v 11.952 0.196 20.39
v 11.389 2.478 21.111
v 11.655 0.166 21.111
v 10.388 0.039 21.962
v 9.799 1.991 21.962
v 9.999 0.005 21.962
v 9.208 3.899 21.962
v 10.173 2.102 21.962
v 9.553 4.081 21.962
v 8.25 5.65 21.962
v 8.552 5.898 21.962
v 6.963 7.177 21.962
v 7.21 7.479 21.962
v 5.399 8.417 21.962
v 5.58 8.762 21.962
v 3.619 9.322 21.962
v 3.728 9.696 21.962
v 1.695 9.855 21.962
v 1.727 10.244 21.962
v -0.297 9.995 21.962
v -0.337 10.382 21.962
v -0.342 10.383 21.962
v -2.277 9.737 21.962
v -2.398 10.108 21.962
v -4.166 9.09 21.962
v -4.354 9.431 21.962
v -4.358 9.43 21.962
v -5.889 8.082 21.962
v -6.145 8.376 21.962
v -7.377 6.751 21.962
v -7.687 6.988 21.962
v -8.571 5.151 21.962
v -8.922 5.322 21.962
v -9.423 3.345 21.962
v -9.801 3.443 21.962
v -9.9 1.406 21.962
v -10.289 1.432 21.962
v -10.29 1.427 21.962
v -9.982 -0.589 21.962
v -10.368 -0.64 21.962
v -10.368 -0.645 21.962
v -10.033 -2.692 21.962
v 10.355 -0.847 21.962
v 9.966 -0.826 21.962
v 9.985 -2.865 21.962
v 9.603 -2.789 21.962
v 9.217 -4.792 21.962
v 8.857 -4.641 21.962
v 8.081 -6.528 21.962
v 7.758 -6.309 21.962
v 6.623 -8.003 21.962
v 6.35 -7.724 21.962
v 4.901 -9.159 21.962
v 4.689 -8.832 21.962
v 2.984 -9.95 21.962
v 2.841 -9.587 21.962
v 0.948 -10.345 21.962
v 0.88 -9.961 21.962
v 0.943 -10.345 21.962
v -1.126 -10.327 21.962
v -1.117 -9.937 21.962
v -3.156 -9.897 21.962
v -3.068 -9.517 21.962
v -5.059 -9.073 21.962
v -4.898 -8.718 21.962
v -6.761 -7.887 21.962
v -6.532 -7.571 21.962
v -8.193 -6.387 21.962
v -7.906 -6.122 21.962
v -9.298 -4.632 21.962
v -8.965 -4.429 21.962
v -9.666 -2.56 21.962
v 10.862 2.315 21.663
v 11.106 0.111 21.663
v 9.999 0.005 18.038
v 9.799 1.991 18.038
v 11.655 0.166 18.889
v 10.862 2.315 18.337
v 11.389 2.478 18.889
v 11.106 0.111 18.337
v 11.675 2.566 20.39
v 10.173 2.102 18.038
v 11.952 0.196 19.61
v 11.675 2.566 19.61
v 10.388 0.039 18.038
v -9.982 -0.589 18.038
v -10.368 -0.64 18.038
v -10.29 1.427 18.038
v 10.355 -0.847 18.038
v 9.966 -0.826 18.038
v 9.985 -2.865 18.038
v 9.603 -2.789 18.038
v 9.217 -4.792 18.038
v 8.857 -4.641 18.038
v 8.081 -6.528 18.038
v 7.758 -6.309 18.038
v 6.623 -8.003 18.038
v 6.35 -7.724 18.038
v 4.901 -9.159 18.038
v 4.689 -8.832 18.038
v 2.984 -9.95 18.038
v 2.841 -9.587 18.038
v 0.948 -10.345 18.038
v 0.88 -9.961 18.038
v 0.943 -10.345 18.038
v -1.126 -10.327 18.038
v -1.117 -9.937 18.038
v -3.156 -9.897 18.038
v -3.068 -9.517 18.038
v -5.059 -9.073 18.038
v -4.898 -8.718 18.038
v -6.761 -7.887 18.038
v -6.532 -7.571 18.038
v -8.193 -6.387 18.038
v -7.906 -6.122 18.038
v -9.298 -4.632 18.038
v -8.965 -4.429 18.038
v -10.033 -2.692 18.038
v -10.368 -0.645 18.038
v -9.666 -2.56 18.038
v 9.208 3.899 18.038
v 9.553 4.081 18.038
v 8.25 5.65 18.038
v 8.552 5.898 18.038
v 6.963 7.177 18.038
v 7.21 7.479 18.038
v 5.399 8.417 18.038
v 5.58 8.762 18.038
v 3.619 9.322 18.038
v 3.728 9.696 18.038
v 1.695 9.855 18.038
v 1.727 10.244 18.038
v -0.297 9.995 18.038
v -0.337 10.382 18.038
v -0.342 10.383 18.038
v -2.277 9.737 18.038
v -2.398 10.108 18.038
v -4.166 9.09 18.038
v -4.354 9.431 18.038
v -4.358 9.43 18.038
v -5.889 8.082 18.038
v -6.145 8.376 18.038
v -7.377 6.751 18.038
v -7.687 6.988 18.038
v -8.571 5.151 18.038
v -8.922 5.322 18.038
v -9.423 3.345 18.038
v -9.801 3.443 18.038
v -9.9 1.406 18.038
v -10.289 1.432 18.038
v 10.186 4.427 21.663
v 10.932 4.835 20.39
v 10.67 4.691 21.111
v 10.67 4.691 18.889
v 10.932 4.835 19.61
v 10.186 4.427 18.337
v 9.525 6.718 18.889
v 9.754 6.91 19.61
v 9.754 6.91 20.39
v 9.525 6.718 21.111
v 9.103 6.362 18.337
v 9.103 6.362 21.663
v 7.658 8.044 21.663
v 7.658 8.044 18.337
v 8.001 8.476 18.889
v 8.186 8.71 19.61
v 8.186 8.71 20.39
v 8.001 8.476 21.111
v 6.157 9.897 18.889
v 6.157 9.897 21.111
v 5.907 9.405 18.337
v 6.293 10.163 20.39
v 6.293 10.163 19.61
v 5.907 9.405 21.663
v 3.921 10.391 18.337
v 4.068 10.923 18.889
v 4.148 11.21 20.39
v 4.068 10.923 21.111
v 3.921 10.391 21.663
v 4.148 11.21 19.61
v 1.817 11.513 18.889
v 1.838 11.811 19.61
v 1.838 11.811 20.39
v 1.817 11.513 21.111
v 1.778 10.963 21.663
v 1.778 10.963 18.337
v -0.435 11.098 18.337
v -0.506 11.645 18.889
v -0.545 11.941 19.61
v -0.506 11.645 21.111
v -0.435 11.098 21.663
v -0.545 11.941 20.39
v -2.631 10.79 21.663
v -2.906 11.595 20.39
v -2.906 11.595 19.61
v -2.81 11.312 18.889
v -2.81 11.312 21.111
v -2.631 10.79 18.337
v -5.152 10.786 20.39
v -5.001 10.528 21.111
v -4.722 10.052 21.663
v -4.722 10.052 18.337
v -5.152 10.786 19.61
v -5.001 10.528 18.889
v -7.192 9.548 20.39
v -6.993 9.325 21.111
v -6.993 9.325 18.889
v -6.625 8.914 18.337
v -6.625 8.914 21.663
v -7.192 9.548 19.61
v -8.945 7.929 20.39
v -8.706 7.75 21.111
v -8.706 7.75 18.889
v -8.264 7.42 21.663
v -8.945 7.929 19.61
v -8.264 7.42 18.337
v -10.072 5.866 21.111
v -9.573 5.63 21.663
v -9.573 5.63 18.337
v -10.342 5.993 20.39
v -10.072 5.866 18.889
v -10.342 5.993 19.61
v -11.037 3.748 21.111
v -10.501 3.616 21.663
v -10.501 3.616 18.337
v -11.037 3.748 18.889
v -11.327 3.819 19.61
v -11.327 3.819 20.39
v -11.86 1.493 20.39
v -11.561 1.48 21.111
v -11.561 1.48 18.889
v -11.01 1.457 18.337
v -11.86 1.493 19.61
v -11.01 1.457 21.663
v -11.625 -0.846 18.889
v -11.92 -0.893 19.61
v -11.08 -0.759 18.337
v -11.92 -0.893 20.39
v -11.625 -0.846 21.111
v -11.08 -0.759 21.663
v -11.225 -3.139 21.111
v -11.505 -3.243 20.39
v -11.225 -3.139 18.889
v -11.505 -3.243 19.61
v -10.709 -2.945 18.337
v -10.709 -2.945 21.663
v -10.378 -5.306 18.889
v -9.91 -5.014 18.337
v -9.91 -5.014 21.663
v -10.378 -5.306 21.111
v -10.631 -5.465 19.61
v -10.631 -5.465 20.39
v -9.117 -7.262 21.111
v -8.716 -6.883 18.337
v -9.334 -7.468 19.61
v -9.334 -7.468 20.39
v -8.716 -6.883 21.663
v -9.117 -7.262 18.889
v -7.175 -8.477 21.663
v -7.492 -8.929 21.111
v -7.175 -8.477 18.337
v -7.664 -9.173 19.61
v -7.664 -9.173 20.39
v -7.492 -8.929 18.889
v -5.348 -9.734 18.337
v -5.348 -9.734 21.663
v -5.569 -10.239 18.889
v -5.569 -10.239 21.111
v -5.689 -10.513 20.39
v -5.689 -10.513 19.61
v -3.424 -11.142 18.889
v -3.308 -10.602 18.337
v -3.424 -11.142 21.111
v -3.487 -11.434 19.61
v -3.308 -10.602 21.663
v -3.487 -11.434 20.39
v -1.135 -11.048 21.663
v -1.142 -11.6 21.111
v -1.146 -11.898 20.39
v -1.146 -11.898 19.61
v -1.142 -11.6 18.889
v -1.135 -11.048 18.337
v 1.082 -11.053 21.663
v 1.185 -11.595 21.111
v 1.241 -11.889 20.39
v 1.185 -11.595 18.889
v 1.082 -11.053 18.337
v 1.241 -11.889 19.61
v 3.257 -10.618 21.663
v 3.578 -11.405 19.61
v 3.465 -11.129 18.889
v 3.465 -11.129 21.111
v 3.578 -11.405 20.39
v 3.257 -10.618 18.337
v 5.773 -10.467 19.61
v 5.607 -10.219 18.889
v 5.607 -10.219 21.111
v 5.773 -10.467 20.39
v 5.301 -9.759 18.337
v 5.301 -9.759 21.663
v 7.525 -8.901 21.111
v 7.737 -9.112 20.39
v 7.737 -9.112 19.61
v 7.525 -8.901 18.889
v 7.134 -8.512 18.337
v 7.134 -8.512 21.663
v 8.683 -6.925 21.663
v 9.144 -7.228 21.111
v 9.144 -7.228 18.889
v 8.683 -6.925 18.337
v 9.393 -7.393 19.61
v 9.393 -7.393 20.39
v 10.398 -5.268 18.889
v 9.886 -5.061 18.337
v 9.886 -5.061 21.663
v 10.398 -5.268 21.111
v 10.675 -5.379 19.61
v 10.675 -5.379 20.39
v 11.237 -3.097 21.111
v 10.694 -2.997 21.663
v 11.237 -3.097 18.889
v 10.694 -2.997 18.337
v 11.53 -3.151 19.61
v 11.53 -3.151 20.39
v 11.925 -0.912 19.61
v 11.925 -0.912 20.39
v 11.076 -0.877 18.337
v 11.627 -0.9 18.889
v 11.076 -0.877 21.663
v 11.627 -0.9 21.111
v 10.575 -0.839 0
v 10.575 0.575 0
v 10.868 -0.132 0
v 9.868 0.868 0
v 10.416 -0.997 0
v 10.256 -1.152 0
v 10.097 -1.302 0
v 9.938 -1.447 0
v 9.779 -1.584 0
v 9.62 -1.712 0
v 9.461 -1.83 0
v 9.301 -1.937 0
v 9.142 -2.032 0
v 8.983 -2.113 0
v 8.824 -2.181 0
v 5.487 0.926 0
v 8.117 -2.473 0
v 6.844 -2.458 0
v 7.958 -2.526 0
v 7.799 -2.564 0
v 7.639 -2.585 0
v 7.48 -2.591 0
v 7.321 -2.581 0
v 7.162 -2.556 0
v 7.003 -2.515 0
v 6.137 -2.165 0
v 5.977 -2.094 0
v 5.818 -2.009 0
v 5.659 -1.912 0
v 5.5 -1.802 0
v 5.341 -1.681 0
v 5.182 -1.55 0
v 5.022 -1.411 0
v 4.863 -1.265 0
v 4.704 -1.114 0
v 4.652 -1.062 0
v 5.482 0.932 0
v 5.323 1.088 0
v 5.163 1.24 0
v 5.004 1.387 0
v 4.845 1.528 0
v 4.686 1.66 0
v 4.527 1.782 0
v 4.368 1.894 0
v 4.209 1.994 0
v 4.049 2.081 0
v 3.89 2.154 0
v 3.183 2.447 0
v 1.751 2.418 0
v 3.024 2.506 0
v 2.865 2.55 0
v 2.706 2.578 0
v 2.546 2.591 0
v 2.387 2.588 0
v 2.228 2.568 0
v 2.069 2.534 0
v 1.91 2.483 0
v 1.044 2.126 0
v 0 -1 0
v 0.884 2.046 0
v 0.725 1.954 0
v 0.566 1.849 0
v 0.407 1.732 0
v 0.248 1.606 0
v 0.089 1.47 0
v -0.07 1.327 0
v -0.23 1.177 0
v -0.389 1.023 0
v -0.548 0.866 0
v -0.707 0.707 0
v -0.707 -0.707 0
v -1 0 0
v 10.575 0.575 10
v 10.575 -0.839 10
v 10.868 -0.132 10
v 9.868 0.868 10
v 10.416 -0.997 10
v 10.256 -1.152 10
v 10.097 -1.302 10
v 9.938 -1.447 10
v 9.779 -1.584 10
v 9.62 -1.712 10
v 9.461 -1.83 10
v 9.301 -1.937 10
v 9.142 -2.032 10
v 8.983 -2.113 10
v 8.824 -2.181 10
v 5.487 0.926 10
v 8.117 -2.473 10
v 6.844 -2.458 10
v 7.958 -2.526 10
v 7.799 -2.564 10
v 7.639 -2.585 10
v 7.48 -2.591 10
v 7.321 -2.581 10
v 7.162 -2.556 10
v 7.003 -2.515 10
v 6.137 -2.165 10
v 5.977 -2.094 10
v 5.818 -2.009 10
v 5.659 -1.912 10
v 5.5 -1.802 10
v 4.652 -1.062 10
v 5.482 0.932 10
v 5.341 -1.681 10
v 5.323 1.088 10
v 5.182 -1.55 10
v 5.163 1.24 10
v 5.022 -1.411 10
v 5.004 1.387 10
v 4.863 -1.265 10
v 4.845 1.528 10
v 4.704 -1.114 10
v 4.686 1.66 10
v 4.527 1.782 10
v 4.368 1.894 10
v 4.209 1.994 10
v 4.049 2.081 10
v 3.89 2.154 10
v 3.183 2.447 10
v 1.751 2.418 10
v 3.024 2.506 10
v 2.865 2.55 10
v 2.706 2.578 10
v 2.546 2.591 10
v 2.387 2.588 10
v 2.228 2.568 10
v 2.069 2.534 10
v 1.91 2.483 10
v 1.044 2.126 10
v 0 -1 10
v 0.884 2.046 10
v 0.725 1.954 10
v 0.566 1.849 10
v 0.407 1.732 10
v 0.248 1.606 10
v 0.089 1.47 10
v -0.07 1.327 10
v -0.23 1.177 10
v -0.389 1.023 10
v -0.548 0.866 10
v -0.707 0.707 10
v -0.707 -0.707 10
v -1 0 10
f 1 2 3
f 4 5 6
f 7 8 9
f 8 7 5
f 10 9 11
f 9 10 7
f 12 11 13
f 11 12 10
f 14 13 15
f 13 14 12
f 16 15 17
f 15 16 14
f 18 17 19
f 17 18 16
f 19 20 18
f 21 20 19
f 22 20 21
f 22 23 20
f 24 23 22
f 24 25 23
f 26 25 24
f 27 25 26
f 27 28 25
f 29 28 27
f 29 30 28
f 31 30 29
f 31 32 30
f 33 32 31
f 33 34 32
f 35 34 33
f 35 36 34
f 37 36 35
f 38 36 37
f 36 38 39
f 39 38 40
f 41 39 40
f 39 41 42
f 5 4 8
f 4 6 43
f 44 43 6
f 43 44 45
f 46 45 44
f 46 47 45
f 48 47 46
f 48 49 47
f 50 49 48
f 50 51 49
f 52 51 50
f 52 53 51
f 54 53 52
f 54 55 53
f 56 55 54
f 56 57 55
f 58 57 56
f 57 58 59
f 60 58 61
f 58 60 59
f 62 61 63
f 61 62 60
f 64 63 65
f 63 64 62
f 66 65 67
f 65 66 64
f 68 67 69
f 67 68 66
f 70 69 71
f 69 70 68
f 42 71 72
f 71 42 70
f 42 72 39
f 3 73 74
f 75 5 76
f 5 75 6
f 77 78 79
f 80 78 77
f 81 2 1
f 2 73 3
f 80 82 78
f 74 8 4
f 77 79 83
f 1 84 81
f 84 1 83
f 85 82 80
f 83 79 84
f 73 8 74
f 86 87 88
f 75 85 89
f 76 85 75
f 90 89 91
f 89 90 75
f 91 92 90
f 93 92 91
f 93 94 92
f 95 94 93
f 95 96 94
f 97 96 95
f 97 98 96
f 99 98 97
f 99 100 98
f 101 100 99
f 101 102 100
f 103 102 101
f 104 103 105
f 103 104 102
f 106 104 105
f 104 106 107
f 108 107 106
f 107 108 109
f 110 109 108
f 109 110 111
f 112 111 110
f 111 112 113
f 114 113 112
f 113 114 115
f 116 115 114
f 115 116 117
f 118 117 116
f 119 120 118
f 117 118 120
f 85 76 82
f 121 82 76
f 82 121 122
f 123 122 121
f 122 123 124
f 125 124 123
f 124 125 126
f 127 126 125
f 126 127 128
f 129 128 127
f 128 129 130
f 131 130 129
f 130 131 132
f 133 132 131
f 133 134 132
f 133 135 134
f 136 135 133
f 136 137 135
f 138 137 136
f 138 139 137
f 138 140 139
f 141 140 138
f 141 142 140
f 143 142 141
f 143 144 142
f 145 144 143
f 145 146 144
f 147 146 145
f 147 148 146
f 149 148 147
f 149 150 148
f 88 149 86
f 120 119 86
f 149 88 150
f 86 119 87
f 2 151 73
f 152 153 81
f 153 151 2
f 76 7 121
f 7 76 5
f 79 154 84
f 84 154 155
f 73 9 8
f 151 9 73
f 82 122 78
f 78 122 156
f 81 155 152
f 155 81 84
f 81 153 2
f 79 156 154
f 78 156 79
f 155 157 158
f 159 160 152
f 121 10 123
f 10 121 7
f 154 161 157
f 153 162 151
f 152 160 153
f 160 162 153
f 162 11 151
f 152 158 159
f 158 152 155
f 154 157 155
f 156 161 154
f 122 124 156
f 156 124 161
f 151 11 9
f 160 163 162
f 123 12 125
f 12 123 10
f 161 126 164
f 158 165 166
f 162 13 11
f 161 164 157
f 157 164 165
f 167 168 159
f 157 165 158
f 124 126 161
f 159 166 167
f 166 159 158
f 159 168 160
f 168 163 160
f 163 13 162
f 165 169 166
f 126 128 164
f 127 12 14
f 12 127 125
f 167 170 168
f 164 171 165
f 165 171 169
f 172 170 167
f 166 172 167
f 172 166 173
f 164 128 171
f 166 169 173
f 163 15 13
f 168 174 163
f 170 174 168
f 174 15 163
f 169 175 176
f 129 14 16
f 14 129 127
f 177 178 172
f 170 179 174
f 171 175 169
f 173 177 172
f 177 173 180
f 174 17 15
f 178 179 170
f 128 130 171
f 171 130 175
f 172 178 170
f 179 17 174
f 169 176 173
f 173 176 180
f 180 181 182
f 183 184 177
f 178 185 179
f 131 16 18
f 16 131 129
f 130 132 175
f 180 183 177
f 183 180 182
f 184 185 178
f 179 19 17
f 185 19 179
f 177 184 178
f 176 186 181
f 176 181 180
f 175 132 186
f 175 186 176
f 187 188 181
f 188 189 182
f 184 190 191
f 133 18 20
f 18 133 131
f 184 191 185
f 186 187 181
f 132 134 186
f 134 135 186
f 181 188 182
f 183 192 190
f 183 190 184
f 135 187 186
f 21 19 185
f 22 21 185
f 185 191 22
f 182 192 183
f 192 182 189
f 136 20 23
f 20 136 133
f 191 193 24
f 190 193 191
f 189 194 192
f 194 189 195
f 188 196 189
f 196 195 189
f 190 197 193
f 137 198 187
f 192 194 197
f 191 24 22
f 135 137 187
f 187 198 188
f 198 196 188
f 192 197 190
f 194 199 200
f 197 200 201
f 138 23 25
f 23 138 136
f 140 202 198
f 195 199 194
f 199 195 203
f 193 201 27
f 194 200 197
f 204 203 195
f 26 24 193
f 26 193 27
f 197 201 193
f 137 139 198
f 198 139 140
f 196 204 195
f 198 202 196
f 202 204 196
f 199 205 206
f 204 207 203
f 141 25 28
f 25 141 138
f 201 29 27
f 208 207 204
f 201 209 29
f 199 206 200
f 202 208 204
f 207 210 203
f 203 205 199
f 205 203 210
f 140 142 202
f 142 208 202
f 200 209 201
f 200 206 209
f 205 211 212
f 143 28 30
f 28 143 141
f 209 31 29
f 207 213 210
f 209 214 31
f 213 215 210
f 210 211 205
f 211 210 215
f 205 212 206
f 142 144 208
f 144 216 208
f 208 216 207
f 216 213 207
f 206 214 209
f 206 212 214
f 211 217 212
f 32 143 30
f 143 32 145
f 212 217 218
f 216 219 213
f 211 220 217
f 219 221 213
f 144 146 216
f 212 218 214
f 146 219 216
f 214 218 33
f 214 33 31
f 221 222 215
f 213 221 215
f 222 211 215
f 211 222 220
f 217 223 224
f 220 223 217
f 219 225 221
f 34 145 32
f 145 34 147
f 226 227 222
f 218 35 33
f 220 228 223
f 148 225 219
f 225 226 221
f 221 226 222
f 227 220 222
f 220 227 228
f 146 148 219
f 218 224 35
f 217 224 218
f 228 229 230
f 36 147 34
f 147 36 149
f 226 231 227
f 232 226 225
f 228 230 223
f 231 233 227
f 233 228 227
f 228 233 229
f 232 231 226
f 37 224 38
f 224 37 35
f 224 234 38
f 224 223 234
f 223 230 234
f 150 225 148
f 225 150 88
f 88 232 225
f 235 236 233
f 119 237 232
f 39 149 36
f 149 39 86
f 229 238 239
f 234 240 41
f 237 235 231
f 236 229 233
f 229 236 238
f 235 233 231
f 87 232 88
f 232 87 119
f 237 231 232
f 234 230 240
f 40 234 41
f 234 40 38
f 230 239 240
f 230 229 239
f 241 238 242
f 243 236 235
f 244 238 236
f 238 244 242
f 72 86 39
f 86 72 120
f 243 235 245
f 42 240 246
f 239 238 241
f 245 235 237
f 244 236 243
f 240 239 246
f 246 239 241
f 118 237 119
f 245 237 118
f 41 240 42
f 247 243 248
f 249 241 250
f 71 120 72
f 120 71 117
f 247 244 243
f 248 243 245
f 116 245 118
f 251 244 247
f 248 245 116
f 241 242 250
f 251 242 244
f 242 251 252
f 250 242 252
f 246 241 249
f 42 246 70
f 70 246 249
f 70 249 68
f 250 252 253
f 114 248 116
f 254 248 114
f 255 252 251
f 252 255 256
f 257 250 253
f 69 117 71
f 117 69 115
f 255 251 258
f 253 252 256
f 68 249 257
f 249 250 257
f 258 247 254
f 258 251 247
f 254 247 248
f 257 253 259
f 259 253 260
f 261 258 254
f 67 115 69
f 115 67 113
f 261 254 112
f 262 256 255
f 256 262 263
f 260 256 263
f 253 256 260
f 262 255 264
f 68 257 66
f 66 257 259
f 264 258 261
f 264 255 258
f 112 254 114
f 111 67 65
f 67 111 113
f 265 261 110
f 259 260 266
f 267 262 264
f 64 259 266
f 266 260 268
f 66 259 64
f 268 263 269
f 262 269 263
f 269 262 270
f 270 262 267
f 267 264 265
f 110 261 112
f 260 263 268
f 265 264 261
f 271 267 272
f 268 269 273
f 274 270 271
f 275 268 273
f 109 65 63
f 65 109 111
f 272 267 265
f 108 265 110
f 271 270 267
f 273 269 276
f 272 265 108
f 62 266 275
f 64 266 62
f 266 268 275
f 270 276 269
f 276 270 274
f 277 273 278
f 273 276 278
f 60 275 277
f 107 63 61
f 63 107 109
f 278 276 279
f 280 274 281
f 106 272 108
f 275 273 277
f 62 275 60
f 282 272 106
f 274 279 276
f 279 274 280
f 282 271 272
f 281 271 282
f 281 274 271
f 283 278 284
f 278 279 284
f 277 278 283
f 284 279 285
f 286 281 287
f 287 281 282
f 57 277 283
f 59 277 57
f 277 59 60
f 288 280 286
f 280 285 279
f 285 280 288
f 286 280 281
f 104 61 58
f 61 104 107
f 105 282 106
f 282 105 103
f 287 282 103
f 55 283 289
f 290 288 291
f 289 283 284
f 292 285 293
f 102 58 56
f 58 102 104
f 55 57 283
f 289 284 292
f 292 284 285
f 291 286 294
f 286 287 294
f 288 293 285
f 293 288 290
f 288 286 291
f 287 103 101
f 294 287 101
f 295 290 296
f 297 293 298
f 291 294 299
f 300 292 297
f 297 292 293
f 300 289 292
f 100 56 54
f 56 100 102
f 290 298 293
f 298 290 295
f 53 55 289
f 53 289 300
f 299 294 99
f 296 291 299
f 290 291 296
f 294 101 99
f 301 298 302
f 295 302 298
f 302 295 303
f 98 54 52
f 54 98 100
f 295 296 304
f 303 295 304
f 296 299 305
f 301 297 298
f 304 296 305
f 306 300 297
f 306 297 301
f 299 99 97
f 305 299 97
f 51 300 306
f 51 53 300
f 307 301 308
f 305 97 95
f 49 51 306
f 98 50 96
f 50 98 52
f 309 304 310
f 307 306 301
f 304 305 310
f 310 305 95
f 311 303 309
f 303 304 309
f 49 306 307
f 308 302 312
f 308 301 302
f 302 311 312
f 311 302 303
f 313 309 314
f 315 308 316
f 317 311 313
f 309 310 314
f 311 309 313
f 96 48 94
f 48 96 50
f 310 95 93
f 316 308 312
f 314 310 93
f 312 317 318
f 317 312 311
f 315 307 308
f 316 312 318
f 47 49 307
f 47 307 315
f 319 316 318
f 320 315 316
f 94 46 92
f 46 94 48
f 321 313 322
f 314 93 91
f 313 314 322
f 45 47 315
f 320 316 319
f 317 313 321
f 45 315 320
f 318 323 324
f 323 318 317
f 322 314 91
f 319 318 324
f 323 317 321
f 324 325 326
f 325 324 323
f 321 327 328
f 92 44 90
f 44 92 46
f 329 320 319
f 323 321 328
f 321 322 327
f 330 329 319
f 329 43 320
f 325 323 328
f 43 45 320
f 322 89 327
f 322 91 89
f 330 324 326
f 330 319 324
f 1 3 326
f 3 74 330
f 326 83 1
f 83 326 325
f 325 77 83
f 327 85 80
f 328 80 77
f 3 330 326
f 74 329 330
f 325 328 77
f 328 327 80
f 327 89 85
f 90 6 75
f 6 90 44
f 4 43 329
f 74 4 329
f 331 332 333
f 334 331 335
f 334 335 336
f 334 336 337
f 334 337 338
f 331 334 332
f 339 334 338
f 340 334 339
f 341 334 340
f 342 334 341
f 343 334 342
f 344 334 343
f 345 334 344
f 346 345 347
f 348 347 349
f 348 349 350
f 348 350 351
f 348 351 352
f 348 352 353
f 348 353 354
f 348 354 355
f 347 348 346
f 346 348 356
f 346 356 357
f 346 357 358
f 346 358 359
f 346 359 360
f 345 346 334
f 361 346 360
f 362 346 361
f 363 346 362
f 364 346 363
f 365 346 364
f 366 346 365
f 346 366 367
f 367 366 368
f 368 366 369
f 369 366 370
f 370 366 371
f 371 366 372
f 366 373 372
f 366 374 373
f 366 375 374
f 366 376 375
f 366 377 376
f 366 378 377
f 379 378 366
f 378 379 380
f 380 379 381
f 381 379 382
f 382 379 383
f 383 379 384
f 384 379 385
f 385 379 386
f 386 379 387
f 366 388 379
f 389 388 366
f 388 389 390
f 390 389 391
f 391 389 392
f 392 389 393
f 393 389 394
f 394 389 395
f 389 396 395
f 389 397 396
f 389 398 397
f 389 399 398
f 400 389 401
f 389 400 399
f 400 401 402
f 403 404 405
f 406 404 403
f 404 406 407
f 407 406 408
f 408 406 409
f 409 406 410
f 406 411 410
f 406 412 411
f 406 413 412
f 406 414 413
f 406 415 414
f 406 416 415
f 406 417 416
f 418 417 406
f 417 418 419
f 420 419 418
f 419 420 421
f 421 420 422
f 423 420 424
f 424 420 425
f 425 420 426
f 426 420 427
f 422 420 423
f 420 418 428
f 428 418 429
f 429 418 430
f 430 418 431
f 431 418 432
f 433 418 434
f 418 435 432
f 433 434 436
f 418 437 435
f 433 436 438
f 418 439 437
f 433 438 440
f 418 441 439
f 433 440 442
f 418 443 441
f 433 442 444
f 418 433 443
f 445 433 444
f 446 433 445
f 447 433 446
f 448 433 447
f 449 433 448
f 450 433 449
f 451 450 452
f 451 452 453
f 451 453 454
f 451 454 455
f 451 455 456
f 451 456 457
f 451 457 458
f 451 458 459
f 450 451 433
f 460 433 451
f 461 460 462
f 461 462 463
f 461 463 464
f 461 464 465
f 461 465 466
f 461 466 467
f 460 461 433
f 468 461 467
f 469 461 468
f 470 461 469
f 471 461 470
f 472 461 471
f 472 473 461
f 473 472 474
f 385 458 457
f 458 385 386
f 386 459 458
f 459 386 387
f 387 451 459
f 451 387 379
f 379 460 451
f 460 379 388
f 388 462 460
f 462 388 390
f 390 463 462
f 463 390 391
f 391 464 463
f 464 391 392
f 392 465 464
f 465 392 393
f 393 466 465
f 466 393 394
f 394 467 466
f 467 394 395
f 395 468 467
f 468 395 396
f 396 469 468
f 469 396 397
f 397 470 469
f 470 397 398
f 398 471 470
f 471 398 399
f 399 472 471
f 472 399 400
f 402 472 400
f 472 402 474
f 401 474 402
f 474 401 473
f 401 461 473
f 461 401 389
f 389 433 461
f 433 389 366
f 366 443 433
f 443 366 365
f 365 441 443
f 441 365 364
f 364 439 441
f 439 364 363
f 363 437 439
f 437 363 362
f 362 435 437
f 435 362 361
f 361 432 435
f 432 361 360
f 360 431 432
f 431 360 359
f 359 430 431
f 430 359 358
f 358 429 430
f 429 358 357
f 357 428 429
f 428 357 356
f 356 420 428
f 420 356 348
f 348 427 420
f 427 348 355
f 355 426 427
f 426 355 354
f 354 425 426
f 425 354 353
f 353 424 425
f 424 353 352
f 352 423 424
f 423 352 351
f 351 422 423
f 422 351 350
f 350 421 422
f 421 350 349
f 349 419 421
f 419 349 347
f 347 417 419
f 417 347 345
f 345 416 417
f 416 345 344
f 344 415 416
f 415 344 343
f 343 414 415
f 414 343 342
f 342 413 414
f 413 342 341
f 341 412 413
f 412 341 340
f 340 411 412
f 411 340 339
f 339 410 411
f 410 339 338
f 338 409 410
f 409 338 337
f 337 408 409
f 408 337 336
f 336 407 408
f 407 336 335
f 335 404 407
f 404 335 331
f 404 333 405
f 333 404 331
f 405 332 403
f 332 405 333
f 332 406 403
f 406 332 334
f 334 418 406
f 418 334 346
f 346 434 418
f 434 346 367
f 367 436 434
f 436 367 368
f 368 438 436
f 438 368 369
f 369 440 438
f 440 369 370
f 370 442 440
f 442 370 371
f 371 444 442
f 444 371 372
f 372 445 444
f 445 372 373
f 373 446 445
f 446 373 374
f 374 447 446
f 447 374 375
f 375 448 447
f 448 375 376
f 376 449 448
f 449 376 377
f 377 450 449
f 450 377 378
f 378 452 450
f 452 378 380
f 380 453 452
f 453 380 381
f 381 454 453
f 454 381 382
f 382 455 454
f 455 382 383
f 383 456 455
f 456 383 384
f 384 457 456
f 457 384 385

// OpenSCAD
module rotateToPath(path, index, closed=false) {
    function getAngle(v) = atan2(v[1],v[0])-90;

    if (index == len(path)-1 && ! closed) {
        rotate([0,0,getAngle(path[index]-path[index-1])]) children();
    }
    else {
        nextIndex = (index == len(path)-1) ? 0 : index + 1;
        rotate([0,0,getAngle(path[nextIndex]-path[index])]) children();
    }
}

module ribbon(points, thickness=1, closed=false, rotate=false) {
    p = closed ? concat(points, [points[0]]) : points;
    
    union() {
        for (i=[1:len(p)-1]) {
            hull() {
                translate(p[i-1]) 
                    if ($children==0)
                        circle(d=thickness, $fn=8);
                    else if (!rotate)
                        children();
                    else 
                        rotateToPath(points,i==0 ? len(points)-1 : i-1,closed=closed) children();
                translate(p[i]) 
                    if ($children==0)
                        circle(d=thickness, $fn=8);
                    else if (!rotate)
                        children();
                    else 
                        rotateToPath(points, i==len(points) ? 0 : i,closed=closed) children();
            }
        }
    }
}

pi = 3.1415926535897932;
function SIN(theta) = sin(theta * 180 / pi);
function COS(theta) = cos(theta * 180 / pi);
function TAN(theta) = tan(theta * 180 / pi);

//<skip>
color("red") linear_extrude(height=10)
 ribbon([for (theta=[0:0.1:2*pi]) [theta * 10 / (2*pi), SIN(theta) * 10 / (2*pi)]], thickness=2, closed=true);
color("blue") linear_extrude(height=10)
 ribbon([for (theta=[0:0.1:2*pi]) [theta * 10 / (2*pi), SIN(theta) * 10 / (2*pi)]], thickness=.1, closed=true);
ribbon([for (theta=[0:0.1:2*pi+.1]) [COS(theta)*10, SIN(3*theta) * 10]], thickness=.5);


translate([0,0,20]) ribbon([for (theta=[0:0.2:2*pi+.1]) [COS(theta)*10, SIN(theta) * 10]], rotate=true, closed=true) intersection() {
    sphere(r=2,$fn=16);
    translate([2,0,0]) cube([4,0.01,4],center=true);
    }
    

//</skip>
    
